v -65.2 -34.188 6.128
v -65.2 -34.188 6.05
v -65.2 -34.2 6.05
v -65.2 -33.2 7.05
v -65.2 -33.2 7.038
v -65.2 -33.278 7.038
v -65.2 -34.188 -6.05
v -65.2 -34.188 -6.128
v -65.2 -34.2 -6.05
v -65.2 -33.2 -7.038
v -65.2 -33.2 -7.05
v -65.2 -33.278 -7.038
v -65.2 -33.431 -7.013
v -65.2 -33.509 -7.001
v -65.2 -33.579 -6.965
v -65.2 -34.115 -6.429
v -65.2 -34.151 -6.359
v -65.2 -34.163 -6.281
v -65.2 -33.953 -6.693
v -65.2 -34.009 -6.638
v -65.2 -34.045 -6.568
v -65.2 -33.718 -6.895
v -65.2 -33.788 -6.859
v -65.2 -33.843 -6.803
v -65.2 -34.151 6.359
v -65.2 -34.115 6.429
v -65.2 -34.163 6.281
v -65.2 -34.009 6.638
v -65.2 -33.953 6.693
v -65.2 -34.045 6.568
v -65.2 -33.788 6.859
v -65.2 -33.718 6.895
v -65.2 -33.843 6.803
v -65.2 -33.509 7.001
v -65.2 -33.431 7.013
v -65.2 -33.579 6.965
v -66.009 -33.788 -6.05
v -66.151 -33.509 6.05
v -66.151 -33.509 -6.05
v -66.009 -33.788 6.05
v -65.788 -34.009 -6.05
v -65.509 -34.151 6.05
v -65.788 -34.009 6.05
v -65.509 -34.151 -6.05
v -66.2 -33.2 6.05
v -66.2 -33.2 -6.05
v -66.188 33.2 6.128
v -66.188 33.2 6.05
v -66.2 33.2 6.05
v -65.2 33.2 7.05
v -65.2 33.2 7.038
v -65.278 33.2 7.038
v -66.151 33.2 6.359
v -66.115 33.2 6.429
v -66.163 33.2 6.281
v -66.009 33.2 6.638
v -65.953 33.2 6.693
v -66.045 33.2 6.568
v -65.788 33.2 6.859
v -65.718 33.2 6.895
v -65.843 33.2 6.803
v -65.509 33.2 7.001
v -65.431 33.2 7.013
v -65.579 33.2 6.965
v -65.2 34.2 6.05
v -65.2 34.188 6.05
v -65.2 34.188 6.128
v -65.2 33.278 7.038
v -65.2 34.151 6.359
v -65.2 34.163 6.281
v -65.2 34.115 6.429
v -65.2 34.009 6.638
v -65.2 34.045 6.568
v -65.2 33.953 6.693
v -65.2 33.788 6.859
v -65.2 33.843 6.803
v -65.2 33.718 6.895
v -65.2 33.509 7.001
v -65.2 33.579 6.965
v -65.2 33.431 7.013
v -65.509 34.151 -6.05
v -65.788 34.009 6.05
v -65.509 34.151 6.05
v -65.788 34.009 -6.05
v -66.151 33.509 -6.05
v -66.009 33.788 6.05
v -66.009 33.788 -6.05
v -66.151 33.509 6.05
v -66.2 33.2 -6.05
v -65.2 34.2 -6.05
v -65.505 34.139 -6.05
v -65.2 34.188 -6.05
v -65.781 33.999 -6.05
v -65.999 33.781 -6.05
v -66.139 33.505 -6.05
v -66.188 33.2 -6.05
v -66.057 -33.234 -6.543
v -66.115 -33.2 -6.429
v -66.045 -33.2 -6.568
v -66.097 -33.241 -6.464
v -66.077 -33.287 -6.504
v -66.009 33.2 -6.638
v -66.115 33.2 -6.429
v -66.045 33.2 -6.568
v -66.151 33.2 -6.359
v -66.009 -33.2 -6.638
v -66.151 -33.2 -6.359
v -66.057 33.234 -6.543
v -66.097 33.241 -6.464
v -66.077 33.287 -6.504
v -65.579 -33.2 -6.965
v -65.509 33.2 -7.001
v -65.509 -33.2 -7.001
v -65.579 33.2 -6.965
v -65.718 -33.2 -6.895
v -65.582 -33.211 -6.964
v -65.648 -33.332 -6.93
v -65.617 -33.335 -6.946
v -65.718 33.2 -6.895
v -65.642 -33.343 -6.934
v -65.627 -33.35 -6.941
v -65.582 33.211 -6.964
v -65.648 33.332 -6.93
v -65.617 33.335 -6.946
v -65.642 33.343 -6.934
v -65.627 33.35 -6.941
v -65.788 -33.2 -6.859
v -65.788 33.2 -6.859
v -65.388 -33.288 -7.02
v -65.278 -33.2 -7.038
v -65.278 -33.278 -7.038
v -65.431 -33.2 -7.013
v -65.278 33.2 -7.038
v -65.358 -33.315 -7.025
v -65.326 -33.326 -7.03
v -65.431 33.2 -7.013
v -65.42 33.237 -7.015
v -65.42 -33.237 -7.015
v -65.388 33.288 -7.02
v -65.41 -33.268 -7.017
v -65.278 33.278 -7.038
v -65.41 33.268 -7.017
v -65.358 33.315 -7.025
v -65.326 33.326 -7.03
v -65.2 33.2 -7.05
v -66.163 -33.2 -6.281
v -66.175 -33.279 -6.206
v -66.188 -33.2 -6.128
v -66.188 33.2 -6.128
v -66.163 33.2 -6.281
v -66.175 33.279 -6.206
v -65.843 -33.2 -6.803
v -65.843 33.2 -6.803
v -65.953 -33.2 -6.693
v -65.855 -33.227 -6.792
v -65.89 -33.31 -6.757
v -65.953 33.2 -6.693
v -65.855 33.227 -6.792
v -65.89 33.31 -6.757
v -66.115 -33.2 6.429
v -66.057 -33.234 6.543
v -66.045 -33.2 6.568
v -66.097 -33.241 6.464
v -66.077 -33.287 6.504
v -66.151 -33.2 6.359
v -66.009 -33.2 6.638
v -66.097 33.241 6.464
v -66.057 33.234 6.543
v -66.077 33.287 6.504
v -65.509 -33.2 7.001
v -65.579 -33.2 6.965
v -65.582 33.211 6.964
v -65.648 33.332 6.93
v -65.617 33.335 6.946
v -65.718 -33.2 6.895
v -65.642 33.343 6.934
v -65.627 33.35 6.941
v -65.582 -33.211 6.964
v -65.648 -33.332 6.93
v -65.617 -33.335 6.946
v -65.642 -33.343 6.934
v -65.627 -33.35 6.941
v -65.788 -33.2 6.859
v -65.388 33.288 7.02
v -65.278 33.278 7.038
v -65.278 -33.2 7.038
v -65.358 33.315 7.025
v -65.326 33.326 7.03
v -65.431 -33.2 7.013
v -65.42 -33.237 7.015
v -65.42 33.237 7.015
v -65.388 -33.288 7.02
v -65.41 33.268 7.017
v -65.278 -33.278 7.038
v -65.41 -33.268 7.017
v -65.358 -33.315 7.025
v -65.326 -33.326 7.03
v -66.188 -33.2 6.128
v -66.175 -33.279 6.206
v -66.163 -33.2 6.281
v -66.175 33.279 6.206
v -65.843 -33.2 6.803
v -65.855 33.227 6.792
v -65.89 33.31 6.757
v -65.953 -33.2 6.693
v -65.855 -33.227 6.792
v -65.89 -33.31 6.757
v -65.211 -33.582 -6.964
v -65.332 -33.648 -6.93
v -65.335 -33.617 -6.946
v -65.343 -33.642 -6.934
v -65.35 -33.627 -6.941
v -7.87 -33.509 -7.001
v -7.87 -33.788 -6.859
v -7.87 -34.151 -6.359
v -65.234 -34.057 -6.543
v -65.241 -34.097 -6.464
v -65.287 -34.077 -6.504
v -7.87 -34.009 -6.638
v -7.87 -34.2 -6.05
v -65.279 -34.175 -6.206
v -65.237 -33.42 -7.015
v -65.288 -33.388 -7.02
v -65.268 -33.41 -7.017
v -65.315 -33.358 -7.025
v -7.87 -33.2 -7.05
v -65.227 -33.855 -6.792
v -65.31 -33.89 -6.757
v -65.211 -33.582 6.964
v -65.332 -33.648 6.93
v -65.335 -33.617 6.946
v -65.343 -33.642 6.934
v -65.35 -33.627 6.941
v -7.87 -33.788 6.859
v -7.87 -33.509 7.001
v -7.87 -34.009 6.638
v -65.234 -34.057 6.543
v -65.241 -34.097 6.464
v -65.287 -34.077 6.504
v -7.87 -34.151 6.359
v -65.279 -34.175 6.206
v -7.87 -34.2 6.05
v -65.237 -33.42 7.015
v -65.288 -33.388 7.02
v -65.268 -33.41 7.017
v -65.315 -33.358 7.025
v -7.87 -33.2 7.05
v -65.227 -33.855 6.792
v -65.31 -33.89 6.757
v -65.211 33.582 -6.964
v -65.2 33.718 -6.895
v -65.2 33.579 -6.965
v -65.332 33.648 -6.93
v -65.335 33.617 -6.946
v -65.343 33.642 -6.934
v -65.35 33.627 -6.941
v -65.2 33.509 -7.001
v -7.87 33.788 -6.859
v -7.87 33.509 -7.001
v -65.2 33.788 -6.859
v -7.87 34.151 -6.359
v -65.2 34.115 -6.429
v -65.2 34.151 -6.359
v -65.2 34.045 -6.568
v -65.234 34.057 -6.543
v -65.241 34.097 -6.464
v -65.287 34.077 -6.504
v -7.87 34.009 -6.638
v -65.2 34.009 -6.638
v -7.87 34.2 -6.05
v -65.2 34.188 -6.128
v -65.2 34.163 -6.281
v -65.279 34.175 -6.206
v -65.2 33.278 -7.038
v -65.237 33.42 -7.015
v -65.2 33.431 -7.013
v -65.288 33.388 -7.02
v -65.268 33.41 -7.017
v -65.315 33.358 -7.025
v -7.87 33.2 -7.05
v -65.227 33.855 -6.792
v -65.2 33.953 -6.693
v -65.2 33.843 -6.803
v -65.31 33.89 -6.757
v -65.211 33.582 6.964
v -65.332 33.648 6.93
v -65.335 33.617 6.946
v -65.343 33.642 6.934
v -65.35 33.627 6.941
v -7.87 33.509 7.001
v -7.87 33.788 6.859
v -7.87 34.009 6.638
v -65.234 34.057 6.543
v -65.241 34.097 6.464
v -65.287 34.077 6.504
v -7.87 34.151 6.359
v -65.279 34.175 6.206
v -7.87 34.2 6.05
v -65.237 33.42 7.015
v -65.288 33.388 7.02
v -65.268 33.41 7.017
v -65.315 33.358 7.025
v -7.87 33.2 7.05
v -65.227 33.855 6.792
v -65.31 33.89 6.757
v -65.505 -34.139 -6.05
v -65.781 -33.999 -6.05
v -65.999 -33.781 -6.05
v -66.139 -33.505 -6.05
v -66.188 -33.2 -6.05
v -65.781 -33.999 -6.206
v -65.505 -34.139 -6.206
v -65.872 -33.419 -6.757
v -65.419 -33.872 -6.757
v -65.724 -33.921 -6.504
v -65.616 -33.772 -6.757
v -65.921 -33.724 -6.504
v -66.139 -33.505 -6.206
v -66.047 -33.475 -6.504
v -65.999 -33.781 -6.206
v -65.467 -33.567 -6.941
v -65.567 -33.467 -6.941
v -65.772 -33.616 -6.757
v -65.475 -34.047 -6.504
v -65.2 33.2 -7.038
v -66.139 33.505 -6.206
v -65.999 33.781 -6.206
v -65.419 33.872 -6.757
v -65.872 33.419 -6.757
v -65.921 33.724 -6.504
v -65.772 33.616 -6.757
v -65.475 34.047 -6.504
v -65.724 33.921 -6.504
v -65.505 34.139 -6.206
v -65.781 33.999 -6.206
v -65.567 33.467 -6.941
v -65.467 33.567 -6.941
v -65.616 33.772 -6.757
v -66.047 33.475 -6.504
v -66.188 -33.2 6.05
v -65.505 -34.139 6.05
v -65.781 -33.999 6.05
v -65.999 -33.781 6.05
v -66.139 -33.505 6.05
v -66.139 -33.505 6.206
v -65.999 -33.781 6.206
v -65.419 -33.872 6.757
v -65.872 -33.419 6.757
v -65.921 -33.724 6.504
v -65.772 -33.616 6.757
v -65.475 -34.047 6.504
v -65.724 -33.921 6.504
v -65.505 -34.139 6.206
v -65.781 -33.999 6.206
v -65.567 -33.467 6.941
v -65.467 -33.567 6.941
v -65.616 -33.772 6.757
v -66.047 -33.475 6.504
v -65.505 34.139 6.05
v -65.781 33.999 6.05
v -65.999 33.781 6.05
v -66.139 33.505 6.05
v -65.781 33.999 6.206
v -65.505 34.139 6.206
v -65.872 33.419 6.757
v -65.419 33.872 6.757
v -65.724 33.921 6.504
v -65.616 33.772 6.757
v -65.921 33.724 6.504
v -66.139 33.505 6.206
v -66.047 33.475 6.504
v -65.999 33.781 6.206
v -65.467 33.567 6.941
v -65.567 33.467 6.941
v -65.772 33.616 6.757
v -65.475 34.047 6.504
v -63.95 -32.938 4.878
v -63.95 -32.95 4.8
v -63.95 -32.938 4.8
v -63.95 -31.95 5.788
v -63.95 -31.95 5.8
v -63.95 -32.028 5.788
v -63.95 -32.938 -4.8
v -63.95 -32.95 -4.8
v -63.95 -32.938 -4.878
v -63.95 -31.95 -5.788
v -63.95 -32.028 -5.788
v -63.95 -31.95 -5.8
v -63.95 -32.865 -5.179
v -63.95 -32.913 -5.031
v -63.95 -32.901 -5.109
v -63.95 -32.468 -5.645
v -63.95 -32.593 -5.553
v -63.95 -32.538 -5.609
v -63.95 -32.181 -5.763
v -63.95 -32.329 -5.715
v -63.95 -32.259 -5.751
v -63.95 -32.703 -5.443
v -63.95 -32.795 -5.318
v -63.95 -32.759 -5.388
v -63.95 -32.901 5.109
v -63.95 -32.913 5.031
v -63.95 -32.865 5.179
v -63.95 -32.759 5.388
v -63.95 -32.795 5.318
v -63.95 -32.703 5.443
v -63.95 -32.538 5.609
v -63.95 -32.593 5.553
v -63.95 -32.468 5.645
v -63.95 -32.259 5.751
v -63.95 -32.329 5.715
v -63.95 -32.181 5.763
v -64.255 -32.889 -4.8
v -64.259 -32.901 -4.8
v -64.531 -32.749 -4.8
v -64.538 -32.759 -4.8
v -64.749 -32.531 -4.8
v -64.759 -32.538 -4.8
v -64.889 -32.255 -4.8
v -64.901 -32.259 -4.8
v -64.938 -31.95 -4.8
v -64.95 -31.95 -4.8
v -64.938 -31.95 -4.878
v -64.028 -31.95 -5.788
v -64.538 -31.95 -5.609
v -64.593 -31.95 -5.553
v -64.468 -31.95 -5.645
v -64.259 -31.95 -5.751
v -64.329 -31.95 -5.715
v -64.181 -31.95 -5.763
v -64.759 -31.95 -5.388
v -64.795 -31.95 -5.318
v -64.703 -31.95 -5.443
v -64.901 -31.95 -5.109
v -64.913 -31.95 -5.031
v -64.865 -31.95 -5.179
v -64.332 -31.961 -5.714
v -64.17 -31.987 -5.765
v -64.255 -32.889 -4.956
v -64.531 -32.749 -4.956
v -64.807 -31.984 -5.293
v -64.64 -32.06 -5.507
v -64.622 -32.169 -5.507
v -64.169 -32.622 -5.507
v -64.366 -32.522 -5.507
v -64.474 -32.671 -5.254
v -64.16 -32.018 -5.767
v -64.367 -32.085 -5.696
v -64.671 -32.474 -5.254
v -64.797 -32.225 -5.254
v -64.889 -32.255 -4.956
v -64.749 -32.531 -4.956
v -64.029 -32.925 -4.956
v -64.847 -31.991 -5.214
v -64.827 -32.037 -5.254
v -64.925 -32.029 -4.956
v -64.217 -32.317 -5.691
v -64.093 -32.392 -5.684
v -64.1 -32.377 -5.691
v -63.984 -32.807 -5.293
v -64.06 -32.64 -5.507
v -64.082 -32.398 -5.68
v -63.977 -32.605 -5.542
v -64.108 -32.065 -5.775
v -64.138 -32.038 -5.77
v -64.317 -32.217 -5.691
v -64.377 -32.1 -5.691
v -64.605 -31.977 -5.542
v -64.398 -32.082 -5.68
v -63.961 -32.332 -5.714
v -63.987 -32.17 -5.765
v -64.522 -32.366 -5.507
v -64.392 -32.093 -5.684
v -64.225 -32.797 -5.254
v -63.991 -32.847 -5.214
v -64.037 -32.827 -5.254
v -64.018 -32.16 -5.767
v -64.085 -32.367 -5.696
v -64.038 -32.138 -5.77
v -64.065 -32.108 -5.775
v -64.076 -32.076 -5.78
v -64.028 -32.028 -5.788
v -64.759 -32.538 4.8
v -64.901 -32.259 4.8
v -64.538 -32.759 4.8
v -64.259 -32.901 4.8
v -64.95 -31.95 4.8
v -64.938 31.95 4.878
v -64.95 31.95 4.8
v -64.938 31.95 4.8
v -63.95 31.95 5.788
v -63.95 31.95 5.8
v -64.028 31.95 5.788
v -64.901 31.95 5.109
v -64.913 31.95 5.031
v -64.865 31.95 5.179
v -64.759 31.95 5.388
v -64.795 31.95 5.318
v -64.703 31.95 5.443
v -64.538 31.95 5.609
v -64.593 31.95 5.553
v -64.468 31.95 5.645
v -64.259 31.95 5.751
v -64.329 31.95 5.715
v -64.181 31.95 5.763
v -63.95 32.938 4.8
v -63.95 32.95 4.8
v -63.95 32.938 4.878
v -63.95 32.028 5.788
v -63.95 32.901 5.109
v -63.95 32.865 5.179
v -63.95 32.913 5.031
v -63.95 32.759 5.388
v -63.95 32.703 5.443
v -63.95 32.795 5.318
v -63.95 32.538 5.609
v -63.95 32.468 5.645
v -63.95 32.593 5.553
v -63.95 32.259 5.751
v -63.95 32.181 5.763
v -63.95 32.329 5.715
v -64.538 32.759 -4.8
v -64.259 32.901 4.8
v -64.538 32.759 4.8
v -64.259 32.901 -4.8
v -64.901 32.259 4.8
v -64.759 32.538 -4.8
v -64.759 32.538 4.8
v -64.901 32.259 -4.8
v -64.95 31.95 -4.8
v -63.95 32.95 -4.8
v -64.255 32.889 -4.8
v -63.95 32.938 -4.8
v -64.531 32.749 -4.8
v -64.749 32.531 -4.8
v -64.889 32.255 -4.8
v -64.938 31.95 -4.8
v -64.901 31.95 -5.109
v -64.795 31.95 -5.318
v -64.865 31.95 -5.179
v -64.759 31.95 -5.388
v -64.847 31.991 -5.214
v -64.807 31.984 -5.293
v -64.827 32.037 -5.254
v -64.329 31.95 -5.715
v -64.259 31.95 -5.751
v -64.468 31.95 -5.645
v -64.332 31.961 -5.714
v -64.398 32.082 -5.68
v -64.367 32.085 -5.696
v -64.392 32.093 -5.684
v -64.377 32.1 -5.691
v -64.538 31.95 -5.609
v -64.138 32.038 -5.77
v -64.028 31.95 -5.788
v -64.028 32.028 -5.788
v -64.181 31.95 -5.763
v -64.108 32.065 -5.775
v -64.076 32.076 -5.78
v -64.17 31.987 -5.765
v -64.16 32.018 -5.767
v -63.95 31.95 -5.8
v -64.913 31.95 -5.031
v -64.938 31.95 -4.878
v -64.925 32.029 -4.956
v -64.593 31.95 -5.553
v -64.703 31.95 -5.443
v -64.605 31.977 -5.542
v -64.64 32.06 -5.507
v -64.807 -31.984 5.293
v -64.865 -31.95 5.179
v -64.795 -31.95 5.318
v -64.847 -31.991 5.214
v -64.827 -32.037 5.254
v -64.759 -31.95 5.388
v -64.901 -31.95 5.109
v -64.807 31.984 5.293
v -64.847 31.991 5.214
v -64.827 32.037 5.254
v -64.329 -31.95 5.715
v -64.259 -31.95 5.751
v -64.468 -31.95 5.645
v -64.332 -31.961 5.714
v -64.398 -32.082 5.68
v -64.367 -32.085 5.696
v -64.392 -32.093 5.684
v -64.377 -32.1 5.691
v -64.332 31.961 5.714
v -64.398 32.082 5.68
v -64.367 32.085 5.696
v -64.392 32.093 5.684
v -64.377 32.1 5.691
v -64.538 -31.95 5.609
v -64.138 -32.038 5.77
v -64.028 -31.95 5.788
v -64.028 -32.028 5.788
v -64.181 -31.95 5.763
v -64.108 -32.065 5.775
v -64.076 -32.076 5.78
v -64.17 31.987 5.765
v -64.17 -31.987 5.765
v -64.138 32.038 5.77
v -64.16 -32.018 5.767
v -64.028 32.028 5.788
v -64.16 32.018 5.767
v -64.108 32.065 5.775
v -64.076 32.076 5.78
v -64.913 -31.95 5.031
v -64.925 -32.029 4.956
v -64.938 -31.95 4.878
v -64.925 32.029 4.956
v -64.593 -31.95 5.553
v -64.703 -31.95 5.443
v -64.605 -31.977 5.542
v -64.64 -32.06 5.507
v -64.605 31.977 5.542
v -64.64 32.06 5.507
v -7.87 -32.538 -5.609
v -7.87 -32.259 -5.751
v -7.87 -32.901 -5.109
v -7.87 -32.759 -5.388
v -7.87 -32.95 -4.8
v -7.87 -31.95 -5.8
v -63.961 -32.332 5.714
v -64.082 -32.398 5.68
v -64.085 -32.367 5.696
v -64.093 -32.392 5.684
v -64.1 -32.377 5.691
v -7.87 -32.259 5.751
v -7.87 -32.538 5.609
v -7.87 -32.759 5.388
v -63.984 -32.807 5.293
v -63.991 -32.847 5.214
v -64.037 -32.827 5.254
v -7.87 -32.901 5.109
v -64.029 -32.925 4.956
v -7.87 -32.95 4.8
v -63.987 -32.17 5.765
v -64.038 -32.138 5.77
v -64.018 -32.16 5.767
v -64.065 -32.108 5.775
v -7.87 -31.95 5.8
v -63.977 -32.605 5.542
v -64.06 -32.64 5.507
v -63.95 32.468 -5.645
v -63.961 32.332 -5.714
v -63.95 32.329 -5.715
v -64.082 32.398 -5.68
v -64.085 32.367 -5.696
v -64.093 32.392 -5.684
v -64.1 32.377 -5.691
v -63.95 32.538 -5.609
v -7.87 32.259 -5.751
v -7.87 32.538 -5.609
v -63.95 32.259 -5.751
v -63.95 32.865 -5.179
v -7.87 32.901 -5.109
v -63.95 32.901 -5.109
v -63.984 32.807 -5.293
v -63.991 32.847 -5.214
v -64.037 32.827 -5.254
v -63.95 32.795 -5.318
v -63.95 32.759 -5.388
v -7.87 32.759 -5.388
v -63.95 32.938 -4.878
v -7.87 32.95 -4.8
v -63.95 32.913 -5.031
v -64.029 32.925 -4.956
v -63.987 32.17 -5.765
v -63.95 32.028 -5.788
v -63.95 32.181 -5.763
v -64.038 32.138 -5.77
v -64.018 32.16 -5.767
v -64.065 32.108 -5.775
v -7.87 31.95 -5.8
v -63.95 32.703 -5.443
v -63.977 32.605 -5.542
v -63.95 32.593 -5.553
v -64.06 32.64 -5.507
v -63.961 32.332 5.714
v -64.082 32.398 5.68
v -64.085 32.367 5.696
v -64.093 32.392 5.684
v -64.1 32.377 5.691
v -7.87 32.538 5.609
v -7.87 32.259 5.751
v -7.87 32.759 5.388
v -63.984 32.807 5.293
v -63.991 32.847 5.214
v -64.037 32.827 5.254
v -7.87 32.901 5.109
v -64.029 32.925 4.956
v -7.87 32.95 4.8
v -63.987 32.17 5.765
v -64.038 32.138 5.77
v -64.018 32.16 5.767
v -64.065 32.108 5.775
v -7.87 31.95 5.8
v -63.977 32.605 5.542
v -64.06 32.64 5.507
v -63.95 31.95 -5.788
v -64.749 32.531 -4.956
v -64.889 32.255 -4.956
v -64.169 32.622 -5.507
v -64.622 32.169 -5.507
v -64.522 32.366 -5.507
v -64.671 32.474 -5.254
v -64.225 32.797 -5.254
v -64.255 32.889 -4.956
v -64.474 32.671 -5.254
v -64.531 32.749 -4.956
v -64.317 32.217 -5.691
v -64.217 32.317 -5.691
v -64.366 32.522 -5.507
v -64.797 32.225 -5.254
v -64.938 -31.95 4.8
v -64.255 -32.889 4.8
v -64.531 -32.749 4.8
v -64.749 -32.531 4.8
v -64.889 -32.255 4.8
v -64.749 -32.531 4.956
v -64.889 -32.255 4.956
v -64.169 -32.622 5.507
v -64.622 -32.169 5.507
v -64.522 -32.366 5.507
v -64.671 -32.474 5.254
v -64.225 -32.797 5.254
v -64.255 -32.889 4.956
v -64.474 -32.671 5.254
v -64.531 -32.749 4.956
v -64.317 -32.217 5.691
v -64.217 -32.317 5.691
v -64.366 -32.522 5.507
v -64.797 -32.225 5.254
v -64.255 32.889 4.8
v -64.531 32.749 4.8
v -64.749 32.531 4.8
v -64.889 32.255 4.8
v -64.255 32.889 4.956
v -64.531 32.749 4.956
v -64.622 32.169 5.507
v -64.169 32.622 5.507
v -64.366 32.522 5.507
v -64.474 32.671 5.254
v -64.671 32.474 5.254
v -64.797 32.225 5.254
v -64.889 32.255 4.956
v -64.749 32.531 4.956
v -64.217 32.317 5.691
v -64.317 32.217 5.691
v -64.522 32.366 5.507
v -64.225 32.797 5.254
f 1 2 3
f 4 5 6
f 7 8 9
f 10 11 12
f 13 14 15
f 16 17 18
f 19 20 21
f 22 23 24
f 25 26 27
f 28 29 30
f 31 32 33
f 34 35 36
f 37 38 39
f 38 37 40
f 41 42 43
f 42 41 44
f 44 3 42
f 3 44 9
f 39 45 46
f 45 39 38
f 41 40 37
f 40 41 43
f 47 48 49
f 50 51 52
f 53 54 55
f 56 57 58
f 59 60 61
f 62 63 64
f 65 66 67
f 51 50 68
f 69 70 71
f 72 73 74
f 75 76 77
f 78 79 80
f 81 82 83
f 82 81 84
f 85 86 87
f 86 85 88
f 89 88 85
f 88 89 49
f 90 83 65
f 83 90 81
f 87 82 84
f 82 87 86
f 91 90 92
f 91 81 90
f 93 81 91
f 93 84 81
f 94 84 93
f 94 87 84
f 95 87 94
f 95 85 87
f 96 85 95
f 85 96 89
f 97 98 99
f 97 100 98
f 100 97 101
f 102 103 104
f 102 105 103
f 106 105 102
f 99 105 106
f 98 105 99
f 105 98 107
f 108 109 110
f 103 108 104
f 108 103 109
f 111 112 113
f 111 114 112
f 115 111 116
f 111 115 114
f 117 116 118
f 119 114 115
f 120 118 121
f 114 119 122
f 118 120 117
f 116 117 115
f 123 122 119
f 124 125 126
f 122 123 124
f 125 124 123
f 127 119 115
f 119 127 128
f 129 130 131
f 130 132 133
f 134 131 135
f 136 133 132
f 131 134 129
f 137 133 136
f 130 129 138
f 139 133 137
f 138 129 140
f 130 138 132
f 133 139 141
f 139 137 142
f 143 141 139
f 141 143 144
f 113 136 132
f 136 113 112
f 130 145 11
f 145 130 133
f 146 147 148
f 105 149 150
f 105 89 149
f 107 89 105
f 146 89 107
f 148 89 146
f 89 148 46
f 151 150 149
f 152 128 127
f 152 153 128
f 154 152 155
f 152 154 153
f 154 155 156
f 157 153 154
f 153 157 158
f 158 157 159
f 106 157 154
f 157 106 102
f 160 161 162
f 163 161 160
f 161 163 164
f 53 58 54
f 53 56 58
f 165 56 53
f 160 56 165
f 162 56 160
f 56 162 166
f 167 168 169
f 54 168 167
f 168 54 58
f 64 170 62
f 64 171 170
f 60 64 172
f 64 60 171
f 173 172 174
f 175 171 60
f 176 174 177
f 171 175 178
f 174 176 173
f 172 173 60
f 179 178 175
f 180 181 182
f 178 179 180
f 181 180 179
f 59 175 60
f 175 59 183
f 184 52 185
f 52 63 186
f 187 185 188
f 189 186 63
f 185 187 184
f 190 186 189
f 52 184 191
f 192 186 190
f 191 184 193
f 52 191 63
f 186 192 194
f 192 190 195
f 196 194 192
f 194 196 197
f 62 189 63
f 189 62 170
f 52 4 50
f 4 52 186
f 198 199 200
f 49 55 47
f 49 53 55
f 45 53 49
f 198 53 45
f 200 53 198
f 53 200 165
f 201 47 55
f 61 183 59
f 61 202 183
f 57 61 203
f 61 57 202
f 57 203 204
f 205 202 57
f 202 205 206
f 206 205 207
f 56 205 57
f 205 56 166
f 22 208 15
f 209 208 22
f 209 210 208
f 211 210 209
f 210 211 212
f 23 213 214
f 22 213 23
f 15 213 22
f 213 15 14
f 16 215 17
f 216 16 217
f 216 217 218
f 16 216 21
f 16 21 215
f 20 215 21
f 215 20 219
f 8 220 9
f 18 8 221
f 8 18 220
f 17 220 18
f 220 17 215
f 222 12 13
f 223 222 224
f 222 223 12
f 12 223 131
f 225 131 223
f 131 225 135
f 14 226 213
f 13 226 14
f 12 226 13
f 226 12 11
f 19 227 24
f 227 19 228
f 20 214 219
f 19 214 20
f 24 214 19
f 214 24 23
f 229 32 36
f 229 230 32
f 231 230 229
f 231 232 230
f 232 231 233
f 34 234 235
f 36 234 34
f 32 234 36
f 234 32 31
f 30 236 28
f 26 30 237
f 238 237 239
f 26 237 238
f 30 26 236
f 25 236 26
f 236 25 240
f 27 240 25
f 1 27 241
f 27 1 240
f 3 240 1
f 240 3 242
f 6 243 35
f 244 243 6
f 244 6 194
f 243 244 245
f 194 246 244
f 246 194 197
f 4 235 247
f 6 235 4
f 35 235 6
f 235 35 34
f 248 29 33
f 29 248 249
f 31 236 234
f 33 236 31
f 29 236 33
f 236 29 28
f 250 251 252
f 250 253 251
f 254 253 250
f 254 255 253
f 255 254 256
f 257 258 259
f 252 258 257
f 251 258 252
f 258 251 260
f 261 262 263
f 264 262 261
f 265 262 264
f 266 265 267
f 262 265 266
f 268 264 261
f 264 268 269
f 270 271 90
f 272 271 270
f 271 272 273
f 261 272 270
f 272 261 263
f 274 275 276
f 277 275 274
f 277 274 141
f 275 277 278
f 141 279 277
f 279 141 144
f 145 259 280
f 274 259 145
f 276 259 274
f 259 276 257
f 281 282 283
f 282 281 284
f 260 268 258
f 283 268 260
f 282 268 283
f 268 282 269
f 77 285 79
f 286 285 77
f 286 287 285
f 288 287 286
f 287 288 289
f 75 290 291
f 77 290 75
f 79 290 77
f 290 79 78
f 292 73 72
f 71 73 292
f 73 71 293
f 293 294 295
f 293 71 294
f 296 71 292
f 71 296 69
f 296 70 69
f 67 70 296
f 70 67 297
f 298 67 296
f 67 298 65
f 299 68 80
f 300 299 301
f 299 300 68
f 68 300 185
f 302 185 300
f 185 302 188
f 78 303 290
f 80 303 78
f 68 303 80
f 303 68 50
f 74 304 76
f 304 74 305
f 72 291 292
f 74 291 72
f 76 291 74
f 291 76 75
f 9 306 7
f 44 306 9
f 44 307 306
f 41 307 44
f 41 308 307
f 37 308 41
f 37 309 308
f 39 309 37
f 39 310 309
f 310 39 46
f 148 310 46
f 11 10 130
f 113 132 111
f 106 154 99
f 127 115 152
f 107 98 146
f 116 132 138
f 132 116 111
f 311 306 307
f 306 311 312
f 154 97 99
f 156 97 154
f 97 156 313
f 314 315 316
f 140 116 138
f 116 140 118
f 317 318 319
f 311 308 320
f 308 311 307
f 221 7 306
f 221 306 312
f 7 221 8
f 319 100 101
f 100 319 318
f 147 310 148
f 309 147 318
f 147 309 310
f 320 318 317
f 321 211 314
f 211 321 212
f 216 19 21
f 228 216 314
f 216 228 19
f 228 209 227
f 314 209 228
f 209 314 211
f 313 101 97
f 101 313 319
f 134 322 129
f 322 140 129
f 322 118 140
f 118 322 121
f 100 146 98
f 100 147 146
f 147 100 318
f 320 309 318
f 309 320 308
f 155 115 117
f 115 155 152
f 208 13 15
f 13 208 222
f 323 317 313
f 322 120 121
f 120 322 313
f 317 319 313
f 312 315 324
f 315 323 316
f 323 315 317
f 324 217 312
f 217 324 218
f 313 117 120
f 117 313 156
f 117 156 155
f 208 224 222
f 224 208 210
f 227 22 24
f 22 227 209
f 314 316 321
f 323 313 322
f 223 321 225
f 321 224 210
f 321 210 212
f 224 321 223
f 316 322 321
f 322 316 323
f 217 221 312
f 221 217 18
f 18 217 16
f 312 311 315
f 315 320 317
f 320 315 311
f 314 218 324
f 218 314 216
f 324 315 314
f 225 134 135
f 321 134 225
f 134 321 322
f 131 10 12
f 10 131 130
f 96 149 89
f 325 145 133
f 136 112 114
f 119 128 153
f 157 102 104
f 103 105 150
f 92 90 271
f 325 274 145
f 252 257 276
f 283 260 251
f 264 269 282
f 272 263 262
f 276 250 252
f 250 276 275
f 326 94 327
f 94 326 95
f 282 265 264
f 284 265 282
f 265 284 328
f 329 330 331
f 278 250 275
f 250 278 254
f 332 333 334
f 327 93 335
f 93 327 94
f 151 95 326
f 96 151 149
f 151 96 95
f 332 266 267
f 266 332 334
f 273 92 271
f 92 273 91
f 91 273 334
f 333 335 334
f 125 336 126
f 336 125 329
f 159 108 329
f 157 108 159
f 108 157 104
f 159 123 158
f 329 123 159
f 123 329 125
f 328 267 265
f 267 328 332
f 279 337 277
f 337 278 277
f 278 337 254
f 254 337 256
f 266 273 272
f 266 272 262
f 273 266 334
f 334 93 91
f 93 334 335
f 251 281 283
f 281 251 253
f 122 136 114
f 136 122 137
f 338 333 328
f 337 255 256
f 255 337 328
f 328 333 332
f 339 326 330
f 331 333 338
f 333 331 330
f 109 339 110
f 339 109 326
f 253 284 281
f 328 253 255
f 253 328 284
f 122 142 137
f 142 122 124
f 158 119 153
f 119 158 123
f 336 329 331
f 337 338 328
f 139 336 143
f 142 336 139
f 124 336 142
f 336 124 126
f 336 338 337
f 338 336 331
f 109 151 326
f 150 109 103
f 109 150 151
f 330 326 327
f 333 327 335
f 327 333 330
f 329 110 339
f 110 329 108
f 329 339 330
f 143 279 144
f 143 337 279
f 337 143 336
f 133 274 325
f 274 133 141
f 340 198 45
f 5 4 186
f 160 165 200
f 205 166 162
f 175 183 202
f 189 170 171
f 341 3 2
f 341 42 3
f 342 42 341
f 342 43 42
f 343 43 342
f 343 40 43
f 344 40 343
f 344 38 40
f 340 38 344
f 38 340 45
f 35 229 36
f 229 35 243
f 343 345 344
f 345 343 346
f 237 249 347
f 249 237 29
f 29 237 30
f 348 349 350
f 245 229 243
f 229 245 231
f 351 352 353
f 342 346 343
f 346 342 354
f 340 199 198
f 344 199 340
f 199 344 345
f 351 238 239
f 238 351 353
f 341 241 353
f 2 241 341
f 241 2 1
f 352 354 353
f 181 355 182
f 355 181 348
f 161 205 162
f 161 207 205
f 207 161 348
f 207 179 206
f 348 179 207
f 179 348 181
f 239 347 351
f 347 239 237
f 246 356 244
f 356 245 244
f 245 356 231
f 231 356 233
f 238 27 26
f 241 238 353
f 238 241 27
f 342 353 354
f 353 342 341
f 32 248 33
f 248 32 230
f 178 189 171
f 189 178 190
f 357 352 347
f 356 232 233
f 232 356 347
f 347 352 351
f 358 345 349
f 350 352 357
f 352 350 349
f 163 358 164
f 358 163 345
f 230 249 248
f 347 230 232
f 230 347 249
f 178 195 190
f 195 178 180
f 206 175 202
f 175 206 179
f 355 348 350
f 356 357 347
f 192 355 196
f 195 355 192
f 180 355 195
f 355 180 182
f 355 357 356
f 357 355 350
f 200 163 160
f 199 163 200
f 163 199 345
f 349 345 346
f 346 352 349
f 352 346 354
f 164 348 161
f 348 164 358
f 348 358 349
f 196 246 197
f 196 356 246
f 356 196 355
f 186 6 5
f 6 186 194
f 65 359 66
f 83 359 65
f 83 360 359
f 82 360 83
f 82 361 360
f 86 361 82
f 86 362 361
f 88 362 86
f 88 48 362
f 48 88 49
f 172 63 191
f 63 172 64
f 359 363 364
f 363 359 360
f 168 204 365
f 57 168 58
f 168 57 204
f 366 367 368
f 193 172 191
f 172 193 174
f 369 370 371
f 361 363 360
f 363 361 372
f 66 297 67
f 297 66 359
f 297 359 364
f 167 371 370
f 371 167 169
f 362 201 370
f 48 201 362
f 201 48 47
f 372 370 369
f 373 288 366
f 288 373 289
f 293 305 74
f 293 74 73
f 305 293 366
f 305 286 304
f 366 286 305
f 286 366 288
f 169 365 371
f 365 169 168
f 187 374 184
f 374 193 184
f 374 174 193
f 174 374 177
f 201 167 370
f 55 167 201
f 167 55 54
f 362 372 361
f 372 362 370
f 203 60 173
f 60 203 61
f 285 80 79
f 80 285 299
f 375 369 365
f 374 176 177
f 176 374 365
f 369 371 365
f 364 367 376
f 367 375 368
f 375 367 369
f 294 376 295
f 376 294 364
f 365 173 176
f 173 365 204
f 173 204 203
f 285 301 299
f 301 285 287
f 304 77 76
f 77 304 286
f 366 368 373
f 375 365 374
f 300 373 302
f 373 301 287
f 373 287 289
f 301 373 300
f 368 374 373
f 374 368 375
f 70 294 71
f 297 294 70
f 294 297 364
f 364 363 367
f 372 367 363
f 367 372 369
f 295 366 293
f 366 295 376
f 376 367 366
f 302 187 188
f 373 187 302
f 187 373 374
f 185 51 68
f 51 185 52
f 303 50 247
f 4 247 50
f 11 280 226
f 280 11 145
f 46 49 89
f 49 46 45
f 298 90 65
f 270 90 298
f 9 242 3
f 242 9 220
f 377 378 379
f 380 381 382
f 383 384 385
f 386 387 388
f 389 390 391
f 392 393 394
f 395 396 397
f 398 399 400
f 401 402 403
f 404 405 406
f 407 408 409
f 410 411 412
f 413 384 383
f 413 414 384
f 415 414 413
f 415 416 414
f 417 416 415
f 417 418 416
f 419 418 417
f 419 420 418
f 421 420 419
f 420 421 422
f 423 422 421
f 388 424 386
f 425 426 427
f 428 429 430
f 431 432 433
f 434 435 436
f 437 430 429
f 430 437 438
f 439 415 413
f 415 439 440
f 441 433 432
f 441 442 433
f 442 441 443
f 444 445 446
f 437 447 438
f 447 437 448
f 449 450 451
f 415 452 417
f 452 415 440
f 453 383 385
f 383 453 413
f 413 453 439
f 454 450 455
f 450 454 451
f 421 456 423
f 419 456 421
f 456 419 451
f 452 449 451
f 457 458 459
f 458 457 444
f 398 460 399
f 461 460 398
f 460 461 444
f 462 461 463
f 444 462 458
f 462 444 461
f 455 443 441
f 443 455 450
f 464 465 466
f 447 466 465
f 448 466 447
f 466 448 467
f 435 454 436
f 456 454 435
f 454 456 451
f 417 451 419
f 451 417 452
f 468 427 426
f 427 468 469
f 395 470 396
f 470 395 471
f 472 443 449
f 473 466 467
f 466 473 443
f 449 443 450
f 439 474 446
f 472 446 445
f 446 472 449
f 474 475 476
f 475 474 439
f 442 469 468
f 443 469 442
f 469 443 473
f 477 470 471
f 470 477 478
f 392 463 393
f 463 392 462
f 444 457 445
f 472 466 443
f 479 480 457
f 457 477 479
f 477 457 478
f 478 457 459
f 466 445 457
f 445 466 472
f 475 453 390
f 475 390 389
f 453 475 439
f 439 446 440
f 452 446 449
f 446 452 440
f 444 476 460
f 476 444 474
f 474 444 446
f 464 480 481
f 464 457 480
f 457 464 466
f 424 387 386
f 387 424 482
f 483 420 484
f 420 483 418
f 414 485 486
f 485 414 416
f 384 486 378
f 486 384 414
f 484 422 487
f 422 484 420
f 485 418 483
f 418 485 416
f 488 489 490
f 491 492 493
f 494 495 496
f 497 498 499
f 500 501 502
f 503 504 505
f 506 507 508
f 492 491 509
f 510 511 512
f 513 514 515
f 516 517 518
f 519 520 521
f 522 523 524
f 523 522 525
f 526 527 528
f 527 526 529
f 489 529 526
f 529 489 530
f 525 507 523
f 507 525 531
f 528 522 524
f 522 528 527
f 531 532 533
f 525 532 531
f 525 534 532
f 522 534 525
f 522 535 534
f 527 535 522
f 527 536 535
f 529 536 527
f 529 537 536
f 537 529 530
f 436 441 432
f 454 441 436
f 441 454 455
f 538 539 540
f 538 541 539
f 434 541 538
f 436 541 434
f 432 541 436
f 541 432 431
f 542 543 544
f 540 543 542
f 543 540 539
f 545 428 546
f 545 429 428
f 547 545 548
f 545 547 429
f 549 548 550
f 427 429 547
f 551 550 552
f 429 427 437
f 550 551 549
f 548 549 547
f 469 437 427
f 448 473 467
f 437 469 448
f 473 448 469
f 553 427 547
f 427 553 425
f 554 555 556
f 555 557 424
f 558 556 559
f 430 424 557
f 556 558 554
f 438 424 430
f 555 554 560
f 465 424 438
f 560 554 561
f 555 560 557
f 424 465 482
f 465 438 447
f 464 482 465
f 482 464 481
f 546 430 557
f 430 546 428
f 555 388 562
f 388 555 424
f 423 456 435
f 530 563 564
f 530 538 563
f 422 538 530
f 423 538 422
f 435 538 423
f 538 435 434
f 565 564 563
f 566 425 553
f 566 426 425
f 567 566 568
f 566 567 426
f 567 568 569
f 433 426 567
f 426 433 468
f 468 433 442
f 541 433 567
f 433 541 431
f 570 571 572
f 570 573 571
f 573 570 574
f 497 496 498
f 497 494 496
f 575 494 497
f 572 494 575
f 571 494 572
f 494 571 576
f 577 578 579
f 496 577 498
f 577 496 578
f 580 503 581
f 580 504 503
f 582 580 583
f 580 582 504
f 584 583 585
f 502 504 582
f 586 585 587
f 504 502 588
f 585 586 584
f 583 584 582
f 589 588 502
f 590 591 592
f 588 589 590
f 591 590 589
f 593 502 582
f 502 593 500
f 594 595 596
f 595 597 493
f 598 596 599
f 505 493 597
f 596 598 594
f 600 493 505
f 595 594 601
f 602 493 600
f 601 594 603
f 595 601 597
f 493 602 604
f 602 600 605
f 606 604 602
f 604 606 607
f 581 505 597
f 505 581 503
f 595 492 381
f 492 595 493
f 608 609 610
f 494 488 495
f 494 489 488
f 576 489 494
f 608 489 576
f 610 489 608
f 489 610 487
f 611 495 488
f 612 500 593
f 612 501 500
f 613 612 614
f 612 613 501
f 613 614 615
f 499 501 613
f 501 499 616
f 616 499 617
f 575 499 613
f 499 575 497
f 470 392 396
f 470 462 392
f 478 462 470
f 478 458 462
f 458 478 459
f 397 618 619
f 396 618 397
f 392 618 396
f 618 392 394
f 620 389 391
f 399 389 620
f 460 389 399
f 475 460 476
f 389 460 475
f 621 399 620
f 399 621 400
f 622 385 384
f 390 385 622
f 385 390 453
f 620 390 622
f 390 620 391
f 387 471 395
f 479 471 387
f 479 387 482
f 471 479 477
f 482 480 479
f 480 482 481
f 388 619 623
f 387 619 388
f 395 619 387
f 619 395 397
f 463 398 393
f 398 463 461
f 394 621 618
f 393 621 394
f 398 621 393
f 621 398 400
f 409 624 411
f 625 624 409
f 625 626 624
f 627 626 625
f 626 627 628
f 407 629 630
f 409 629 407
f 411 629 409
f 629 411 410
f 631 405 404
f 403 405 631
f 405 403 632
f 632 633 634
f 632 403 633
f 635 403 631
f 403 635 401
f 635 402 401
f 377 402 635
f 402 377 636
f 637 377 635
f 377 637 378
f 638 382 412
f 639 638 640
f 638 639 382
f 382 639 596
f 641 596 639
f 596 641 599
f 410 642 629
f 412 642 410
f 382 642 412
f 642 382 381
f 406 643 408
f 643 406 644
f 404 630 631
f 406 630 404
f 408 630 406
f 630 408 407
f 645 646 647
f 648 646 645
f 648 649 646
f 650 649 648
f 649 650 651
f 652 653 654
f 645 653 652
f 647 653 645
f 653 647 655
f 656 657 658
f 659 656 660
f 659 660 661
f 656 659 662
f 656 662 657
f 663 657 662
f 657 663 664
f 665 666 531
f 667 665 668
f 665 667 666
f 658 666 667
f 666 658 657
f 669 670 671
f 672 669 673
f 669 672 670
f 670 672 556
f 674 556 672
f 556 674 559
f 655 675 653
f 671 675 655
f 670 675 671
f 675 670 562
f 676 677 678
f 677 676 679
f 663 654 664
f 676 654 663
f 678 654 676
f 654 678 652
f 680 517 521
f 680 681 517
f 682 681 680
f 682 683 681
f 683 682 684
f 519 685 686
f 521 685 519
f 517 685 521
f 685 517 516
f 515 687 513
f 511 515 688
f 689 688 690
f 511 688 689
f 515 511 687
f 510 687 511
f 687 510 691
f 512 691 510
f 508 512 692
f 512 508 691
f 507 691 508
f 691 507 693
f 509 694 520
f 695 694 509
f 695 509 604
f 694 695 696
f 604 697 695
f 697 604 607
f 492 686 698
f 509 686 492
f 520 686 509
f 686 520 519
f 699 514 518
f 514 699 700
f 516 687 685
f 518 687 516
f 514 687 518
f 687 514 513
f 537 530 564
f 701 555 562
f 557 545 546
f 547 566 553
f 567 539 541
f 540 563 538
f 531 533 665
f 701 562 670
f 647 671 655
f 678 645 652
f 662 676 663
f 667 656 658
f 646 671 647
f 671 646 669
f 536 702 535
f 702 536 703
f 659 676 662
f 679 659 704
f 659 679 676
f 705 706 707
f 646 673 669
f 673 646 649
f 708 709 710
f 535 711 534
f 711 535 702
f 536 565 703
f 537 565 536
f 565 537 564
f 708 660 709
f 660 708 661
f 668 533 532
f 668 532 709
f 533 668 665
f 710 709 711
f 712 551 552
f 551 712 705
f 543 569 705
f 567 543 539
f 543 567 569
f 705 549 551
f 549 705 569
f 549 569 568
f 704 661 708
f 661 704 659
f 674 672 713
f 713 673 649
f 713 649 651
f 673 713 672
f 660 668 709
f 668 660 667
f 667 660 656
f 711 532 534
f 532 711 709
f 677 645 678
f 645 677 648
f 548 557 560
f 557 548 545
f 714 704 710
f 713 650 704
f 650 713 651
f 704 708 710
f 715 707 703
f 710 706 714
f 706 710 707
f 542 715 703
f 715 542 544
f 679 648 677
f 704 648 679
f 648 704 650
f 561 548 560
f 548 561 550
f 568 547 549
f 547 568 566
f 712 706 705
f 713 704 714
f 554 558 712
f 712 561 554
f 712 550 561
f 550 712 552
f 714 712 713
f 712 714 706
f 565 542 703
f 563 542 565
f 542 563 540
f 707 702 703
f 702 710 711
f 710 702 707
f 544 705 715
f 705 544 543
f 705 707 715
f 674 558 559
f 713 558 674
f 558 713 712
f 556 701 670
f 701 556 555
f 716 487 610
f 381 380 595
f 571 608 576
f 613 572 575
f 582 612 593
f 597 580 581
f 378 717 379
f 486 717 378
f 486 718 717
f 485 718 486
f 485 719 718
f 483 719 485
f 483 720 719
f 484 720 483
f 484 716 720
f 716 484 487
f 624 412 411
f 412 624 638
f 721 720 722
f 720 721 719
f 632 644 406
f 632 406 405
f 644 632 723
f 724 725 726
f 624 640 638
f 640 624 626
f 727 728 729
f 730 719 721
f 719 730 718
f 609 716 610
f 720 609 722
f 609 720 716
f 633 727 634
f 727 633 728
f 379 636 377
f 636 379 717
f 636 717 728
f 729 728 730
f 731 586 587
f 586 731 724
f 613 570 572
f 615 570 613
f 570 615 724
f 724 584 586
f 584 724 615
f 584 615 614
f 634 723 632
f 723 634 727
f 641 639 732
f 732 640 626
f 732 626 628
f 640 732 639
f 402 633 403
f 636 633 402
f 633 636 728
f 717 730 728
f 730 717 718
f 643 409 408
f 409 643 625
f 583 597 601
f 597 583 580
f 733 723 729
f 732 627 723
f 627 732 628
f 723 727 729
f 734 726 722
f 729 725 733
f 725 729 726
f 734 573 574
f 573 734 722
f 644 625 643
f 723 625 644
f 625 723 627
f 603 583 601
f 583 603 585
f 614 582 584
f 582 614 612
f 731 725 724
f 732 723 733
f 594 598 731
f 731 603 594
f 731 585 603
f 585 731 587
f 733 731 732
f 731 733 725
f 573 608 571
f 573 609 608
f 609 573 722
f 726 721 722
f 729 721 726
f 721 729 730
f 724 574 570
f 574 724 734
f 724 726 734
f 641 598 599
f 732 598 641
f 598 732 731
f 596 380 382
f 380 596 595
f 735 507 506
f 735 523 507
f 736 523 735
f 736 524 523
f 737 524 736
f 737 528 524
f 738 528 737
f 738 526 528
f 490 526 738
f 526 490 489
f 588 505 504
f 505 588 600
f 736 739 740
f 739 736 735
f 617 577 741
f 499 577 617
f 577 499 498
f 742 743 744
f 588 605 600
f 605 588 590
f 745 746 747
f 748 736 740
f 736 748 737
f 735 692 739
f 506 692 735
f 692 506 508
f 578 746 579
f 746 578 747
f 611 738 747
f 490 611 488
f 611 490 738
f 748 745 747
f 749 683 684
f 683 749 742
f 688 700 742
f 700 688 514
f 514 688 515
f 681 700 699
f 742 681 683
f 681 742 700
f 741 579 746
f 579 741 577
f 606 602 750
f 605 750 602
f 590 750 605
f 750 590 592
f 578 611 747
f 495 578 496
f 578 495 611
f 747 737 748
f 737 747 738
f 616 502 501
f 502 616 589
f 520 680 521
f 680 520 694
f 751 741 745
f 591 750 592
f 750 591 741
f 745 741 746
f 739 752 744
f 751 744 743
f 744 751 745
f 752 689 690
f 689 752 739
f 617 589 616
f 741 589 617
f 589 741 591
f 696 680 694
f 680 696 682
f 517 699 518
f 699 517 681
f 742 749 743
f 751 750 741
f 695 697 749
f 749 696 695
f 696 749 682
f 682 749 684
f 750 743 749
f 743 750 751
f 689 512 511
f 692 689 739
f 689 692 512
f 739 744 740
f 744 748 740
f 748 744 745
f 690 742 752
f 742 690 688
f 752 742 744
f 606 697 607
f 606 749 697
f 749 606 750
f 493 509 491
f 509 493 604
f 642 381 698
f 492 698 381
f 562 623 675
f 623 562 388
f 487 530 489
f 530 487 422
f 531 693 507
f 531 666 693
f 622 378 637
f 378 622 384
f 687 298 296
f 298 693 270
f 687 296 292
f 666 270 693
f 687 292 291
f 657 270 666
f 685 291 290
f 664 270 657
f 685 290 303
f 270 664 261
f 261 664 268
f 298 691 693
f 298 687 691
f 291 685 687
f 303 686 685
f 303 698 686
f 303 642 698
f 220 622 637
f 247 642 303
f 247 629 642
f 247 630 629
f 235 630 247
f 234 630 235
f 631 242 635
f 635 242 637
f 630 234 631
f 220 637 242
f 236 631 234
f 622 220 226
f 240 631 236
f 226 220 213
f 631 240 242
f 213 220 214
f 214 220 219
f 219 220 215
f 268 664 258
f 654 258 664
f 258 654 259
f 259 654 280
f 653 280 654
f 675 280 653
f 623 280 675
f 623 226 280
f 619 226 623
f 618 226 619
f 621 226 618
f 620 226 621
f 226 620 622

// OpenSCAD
// file: ../rcube.scad
// Cube with rounded edges

el = 1e-2;

module rcube_rcorner ( r, fn )
{
   difference() {
      translate ( -el * [ 1, 1, 1 ] ) cube( r + el );
      translate ( [ r, r, r ] ) sphere( r, $fn = fn );
   }
}

module rcube_redge ( r, l, fn )
{
   difference() {
      translate ( -2 * el * [ 1, 1, 1 ] ) cube( [ r + 2 * el, r + 2 * el, l + 4 * el ] );
      translate ( [ r, r, -el ] ) cylinder( r = r, h = l + 2 * el, $fn = fn );
   }
}

module rcube( size = 1, center = false, r = 0, $fn = 20 )
{
        sz = len( size ) == undef ? [ size, size, size ] : size;
        displacement = center == true ? -size / 2: [ 0, 0, 0 ];

        translate( displacement ) {
                difference() {
                        cube( size = sz );
                        union (){
                                // Round the edges:

                                rcube_redge( r, sz[2], fn = $fn );
                                translate( [ sz[0], 0, 0 ] ) rotate( 90, [ 0, 0, 1 ] ) rcube_redge( r, sz[2], fn = $fn );
                                translate( [ sz[0], sz[1], 0 ] ) rotate( 180, [ 0, 0, 1 ] ) rcube_redge( r, sz[2], fn = $fn );
                                translate( [ 0, sz[1], 0 ] ) rotate( 270, [ 0, 0, 1 ] ) rcube_redge( r, sz[2], fn = $fn );

                                translate( [ 0, sz[1], 0 ] ) rotate ( 90, [ 1, 0, 0 ] ) rcube_redge( r, sz[1], fn = $fn );
                                translate( [ 0, 0, sz[2] ] ) rotate ( -90, [ 1, 0, 0 ] ) rcube_redge( r, sz[1], fn = $fn );
                                translate( [ sz[0], 0, 0 ] ) rotate ( 180, [ 0, 1, 1 ] ) rcube_redge( r, sz[1], fn = $fn );
                                translate( [ sz[0], sz[1], sz[2] ] ) rotate ( 180, [ 0, 1, -1 ] ) rcube_redge( r, sz[1], fn = $fn );

                                translate( [ sz[0], 0, 0 ] ) rotate( -90, [ 0, 1, 0 ] )  rcube_redge( r, sz[0], fn = $fn );
                                translate( [ 0, 0, sz[2] ] ) rotate( 90, [ 0, 1, 0 ] )  rcube_redge( r, sz[0], fn = $fn );
                                translate( [ 0, sz[1], 0 ] ) rotate( 180, [ 1, 0, 1 ] )  rcube_redge( r, sz[0], fn = $fn );
                                translate( [ sz[0], sz[1], sz[2] ] ) rotate( 180, [ 1, 0, -1 ] )  rcube_redge( r, sz[0], fn = $fn );

                                // Round the corners:
                                rcube_rcorner( r, fn = $fn );
                                translate( [ sz[0], 0, 0 ] ) rotate( 90, [ 0, 0, 1 ] ) rcube_rcorner( r, fn = $fn );
                                translate( [ sz[0], sz[1], 0 ] ) rotate( 180, [ 0, 0, 1 ] ) rcube_rcorner( r, fn = $fn );
                                translate( [ 0, sz[1], 0 ] ) rotate( 270, [ 0, 0, 1 ] ) rcube_rcorner( r, fn = $fn );

                                translate( [ 0, 0, sz[2] ] ) rotate( 90, [ 0, 0, 1 ] ) rotate( 180, [ 1, 0, 0 ] ) rcube_rcorner( r, fn = $fn );
                                translate( [ sz[0], 0, sz[2] ] ) rotate( 180, [ 0, 0, 1 ] ) rotate( 180, [ 1, 0, 0 ] ) rcube_rcorner( r, fn = $fn );
                                translate( [ sz[0], sz[1], sz[2] ] ) rotate( 270, [ 0, 0, 1 ] ) rotate( 180, [ 1, 0, 0 ] ) rcube_rcorner( r, fn = $fn );
                                translate( [ 0, sz[1], sz[2] ] ) rotate( 180, [ 1, 0, 0 ] ) rcube_rcorner( r, fn = $fn );

                        }
                }
        }
}
// main file
include <../rcube.scad>

// Body shell thickness:
bst = 2.5 * [ 1, 1, 1 ];
// Phone body dimensions:
pbd = [ 129.9, 65.9, 11.6 ];

difference () {
	// Main body:
	rcube( pbd + bst, center = true, r = 1, $fn = 20 );
	// Main space:
	rcube( pbd, center = true, r = 1, $fn = 20 );
	translate ( [ pbd[ 0 ] / 2, 0.1, 0 ] )
		scale( 1.1 )
			cube( pbd + bst, center = true );
}
